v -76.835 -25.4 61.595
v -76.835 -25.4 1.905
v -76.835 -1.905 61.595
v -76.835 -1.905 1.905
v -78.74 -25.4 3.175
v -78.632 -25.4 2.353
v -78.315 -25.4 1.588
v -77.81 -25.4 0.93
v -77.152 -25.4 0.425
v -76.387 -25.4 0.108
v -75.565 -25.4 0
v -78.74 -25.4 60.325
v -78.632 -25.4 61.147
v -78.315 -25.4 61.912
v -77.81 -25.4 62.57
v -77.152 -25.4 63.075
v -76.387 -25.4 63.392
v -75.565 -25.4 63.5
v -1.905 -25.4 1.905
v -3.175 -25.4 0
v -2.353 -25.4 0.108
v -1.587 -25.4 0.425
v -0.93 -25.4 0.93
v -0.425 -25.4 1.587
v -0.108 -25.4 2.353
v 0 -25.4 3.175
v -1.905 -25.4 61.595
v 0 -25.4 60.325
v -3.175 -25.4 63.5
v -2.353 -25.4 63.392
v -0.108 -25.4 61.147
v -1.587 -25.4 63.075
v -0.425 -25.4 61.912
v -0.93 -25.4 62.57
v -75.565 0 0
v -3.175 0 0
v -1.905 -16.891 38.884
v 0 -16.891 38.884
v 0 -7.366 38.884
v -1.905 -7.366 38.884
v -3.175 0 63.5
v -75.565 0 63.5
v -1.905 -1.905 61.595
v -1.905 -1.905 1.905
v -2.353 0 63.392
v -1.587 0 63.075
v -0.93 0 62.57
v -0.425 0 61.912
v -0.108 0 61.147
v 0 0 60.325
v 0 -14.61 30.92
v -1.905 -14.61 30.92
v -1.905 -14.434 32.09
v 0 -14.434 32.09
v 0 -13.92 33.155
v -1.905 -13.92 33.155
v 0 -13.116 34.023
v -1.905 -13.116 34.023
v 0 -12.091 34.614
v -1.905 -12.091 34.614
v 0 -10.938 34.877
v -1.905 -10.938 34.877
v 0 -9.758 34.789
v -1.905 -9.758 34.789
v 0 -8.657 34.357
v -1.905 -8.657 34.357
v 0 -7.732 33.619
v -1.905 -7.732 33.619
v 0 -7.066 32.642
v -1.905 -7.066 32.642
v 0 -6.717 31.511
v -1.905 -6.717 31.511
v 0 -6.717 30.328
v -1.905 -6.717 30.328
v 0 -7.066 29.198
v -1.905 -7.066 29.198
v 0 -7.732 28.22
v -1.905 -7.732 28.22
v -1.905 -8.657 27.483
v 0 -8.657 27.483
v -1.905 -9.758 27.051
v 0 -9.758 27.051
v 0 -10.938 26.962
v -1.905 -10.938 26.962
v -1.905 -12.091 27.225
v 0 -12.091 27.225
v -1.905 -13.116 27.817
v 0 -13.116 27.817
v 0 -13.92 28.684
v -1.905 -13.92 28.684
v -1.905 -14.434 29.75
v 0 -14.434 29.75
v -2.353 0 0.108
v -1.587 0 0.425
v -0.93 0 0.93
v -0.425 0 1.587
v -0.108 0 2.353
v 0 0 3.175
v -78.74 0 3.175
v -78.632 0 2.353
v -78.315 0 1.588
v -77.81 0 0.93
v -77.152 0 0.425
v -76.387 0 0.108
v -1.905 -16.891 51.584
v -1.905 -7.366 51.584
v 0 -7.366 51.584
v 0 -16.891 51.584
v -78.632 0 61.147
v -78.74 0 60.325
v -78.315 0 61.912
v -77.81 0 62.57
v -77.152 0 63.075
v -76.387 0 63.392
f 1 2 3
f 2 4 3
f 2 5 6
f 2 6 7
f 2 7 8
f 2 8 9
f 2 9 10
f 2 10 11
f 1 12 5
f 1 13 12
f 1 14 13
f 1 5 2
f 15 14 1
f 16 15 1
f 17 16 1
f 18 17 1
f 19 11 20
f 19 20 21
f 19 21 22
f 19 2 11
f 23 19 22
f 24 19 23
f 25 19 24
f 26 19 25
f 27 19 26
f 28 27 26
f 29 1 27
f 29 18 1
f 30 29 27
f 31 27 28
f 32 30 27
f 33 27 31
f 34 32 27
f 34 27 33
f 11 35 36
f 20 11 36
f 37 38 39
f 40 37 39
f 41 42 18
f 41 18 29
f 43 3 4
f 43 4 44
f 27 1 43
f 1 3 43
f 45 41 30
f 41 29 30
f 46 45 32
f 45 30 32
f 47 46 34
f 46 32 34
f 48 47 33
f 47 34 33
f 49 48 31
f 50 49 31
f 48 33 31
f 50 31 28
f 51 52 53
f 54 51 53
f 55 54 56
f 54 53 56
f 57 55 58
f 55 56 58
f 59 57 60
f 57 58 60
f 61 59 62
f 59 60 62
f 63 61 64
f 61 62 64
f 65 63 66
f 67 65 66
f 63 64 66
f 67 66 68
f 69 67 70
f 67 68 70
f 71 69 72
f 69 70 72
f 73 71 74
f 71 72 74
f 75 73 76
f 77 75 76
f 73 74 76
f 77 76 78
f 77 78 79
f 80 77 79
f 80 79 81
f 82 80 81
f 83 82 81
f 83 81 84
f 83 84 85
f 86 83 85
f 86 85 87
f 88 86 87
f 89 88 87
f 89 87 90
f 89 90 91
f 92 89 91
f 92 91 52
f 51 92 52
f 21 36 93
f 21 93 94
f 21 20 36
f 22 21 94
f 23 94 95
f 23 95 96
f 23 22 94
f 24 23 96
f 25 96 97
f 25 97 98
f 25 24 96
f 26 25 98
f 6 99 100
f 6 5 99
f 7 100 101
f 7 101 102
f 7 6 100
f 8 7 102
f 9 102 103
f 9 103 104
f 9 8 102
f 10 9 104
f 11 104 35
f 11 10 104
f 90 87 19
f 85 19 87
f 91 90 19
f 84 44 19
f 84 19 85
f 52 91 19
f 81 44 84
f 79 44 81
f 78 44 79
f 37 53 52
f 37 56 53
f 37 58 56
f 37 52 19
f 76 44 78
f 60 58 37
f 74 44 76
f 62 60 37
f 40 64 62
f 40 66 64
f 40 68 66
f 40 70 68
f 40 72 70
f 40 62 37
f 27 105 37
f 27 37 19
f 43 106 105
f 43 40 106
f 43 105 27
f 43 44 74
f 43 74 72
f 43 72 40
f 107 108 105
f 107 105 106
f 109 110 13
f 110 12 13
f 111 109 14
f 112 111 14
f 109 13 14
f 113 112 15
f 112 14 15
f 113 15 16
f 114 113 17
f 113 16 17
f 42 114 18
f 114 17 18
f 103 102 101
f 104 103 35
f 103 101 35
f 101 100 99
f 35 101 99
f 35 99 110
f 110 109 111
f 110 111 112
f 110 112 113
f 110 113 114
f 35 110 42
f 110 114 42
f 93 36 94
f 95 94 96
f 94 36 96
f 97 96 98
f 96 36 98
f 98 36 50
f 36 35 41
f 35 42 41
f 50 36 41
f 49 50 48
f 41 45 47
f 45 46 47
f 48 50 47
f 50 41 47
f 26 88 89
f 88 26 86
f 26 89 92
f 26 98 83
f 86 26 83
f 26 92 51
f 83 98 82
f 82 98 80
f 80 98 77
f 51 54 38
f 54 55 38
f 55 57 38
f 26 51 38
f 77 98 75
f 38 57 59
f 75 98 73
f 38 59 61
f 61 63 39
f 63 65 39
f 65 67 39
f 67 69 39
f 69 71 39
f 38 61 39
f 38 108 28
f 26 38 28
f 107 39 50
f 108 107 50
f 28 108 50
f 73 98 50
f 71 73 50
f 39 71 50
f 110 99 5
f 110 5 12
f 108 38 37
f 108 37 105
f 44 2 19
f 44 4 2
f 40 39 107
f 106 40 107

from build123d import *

# Parameters (mm, degrees)
F0_W     = 78.74
F0_H     = 63.5
F1_DEPTH = 25.4
F2_T     = -1.905
F4_D     = 7.9375
F4_DEPTH = 12.7
F5_W     = 9.525
F5_H     = 12.7
F6_DEPTH = 25.4
F7_R     = 3.175


with BuildPart() as f1:
    # F0 (on Front) → F1 (new body)
    with BuildSketch(Plane.XZ):
        with Locations((-39.37, 31.75)):
            Rectangle(F0_W, F0_H)
    extrude(amount=F1_DEPTH)

    # F2
    f2_openings = [f1.faces().sort_by_distance(p)[0] for p in [
        (-39.37, -25.4, 31.75),
    ]]
    offset(amount=F2_T, openings=f2_openings)

    # F4
    with Locations(Plane.YZ):
        with Locations((-10.64123, 30.9198)):
            Hole(F4_D / 2, depth=F4_DEPTH)

    # F5 (on Right) → F6 (cut)
    with BuildSketch(Plane.YZ):
        with Locations((-12.128341, 45.233511)):
            Rectangle(F5_W, F5_H)
    extrude(amount=-F6_DEPTH, mode=Mode.SUBTRACT)

    # F7
    f7_edges = [f1.edges().sort_by_distance(p)[0] for p in [
        (-78.74, -12.7, 63.5),
        (0, -12.7, 63.5),
        (0, -12.7, 0),
        (-78.74, -12.7, 0),
    ]]
    fillet(f7_edges, radius=F7_R)


solid = f1.part
